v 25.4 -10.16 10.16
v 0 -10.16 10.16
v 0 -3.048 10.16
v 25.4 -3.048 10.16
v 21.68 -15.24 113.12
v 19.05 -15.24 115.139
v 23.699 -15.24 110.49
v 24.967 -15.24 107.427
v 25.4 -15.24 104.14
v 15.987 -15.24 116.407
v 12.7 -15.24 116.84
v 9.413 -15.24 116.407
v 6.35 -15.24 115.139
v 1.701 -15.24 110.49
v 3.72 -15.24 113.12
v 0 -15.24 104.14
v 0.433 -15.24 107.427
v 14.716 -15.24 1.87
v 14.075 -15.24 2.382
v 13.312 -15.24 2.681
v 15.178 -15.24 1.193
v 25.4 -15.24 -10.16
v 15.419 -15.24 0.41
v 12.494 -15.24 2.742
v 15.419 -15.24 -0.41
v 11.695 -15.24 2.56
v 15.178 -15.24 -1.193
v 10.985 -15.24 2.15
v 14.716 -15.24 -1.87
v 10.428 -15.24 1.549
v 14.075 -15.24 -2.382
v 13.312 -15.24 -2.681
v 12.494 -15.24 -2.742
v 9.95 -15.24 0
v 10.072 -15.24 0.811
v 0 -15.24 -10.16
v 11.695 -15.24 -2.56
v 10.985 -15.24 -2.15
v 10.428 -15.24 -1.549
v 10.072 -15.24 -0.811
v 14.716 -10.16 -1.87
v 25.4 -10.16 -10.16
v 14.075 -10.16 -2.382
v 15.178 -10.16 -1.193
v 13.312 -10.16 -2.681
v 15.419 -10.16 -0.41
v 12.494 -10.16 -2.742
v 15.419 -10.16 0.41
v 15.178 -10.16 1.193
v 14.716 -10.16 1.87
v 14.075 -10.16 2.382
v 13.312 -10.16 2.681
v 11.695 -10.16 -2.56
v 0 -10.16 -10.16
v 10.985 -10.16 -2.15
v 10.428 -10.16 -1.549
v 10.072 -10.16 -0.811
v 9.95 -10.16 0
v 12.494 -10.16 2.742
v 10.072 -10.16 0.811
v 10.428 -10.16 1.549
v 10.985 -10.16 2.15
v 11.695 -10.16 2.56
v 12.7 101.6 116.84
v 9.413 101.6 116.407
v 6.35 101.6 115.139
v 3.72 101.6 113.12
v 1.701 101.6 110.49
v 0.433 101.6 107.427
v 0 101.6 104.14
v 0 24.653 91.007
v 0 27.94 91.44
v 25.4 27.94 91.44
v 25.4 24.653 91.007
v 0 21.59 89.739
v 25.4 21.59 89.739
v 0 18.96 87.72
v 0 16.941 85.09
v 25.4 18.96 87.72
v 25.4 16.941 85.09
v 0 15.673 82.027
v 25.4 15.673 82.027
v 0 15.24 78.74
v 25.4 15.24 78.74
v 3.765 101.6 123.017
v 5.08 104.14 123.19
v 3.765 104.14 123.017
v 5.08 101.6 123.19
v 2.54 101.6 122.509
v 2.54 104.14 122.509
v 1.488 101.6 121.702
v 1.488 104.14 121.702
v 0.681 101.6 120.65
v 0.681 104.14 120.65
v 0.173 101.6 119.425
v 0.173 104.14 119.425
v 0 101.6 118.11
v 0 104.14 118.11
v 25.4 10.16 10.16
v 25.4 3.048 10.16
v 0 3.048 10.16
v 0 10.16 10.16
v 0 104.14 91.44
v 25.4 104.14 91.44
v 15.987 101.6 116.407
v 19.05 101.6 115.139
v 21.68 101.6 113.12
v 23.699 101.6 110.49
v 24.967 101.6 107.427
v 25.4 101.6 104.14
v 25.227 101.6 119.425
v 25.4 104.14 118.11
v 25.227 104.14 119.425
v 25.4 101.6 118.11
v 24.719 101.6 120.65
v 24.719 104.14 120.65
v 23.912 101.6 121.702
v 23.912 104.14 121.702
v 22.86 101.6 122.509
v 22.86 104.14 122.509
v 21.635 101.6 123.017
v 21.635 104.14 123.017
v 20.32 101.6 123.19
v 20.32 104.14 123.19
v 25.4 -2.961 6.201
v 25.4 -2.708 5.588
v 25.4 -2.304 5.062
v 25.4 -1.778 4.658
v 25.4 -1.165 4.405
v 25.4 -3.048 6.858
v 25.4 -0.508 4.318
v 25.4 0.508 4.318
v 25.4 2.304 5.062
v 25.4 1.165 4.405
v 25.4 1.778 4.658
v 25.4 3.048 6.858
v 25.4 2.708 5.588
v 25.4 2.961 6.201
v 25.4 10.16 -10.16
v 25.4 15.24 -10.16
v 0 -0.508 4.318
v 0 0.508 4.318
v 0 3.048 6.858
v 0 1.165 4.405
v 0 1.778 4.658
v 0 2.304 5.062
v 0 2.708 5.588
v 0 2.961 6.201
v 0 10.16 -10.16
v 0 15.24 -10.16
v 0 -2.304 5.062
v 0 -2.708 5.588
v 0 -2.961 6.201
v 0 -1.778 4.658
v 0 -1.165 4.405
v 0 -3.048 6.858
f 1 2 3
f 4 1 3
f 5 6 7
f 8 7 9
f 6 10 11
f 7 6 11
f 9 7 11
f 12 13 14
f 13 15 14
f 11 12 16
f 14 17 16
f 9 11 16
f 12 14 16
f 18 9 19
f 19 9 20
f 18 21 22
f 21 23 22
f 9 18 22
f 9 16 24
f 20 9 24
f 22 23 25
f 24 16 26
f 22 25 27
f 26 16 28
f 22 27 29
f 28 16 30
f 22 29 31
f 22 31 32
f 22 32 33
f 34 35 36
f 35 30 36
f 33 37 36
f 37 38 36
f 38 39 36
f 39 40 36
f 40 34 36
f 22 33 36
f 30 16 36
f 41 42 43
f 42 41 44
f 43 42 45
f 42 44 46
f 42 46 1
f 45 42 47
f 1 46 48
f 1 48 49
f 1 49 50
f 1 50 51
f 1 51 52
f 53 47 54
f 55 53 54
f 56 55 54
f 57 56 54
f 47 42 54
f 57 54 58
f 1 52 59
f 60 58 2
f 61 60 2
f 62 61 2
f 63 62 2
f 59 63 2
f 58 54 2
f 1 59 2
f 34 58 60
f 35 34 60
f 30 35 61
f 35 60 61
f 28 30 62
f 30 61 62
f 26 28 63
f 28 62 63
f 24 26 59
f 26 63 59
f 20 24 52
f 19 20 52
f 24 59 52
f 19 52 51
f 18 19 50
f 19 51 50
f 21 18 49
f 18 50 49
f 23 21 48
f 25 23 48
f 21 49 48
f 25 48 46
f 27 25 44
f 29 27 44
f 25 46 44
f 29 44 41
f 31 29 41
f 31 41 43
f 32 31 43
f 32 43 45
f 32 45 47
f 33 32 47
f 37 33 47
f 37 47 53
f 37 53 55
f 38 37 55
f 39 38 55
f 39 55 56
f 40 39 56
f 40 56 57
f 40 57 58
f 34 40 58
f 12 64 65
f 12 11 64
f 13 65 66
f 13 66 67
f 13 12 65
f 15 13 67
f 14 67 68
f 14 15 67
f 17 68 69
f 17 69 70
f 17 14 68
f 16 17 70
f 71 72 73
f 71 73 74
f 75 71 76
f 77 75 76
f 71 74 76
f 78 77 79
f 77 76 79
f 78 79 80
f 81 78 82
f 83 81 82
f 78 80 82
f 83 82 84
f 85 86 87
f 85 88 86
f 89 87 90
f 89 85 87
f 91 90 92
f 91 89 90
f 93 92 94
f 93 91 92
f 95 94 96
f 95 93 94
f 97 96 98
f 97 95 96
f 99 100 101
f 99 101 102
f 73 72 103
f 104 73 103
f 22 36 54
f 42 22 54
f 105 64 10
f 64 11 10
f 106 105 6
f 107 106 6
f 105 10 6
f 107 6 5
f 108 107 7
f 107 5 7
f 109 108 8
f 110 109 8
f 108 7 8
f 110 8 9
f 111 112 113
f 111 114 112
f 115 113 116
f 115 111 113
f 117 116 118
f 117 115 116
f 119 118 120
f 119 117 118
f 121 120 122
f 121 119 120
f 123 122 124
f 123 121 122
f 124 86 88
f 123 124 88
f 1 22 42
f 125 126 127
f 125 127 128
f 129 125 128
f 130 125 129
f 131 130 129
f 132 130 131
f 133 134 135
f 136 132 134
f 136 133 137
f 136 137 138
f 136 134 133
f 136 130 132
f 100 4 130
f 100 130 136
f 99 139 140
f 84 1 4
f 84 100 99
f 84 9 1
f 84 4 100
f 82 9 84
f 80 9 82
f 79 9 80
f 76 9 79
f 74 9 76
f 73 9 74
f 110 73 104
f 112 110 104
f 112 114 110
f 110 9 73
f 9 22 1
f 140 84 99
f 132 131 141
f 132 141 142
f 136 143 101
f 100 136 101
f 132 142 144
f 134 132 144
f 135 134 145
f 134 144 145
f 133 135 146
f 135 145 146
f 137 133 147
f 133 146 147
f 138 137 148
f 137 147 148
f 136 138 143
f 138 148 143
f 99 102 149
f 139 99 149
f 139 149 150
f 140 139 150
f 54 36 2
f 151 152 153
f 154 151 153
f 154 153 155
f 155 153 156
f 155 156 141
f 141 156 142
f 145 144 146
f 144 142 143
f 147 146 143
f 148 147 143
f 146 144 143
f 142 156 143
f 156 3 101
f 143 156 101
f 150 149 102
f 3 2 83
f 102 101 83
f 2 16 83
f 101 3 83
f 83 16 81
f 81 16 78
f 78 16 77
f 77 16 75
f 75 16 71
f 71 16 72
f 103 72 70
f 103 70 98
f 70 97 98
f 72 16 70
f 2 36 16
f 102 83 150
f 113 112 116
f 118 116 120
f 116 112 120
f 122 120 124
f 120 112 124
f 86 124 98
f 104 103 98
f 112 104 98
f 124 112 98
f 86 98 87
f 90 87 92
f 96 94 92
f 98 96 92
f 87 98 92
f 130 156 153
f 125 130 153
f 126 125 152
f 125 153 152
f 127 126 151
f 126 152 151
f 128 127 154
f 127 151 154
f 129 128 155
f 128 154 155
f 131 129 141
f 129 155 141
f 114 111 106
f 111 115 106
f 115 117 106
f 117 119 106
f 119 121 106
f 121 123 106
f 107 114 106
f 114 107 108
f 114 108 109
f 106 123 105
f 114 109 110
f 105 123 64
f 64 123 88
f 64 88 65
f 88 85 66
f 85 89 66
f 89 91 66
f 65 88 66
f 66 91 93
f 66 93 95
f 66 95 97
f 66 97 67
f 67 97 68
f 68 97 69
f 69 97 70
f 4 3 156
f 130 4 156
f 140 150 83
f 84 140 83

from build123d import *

# Parameters (mm, degrees)
F1_DEPTH = 25.4
F2_R     = 12.69999
F3_R     = 5.08
F4_R     = 12.7
F6_D     = 5.5
F6_DEPTH = 5.588
F6_TIP   = 1.6523667023


# Not quite as in the source:
# - a fillet or chamfer is up to 0.001 mm smaller than in the source, because OpenCascade refuses the exact size


with BuildPart() as f1:
    # F0 (on Right) → F1 (new body)
    with BuildSketch(Plane.YZ):
        with BuildLine():
            Line((3.048, 10.16), (10.16, 10.16))
            Line((10.16, 10.16), (10.16, -10.16))
            Line((10.16, -10.16), (15.24, -10.16))
            Line((15.24, -10.16), (15.24, 91.44))
            Line((15.24, 91.44), (104.14, 91.44))
            Line((104.14, 91.44), (104.14, 123.19))
            Line((104.14, 123.19), (101.6, 123.19))
            Line((101.6, 123.19), (101.6, 116.84))
            Line((101.6, 116.84), (-15.24, 116.84))
            Line((-15.24, 116.84), (-15.24, -10.16))
            Line((-15.24, -10.16), (-10.16, -10.16))
            Line((-10.16, -10.16), (-10.16, 10.16))
            Line((-10.16, 10.16), (-3.048, 10.16))
            Line((-3.048, 10.16), (-3.048, 6.858))
            ThreePointArc((-3.048, 6.858), (-2.3040512242, 5.0619487758), (-0.508, 4.318))
            Line((-0.508, 4.318), (0.508, 4.318))
            ThreePointArc((0.508, 4.318), (2.3040512242, 5.0619487758), (3.048, 6.858))
            Line((3.048, 6.858), (3.048, 10.16))
        make_face()
    extrude(amount=F1_DEPTH)

    # F2 (radius 12.7 in the source; OpenCascade refuses exactly that, so slightly less here)
    f2_edges = [f1.edges().sort_by_distance(p)[0] for p in [
        (25.4, 43.18, 116.84),
        (0, 43.18, 116.84),
    ]]
    fillet(f2_edges, radius=F2_R)

    # F3
    f3_edges = [f1.edges().sort_by_distance(p)[0] for p in [
        (0, 102.87, 123.19),
        (25.4, 102.87, 123.19),
    ]]
    fillet(f3_edges, radius=F3_R)

    # F4
    f4_edges = [f1.edges().sort_by_distance(p)[0] for p in [
        (12.7, 15.24, 91.44),
    ]]
    fillet(f4_edges, radius=F4_R)

    # F6
    with Locations(Plane.XZ.offset(15.24)):
        with Locations((12.7, 0)):
            Hole(F6_D / 2, depth=F6_DEPTH)
            with Locations((0, 0, -(F6_DEPTH + F6_TIP / 2))):  # 118° drill point
                Cone(0, F6_D / 2, F6_TIP, mode=Mode.SUBTRACT)


solid = f1.part
